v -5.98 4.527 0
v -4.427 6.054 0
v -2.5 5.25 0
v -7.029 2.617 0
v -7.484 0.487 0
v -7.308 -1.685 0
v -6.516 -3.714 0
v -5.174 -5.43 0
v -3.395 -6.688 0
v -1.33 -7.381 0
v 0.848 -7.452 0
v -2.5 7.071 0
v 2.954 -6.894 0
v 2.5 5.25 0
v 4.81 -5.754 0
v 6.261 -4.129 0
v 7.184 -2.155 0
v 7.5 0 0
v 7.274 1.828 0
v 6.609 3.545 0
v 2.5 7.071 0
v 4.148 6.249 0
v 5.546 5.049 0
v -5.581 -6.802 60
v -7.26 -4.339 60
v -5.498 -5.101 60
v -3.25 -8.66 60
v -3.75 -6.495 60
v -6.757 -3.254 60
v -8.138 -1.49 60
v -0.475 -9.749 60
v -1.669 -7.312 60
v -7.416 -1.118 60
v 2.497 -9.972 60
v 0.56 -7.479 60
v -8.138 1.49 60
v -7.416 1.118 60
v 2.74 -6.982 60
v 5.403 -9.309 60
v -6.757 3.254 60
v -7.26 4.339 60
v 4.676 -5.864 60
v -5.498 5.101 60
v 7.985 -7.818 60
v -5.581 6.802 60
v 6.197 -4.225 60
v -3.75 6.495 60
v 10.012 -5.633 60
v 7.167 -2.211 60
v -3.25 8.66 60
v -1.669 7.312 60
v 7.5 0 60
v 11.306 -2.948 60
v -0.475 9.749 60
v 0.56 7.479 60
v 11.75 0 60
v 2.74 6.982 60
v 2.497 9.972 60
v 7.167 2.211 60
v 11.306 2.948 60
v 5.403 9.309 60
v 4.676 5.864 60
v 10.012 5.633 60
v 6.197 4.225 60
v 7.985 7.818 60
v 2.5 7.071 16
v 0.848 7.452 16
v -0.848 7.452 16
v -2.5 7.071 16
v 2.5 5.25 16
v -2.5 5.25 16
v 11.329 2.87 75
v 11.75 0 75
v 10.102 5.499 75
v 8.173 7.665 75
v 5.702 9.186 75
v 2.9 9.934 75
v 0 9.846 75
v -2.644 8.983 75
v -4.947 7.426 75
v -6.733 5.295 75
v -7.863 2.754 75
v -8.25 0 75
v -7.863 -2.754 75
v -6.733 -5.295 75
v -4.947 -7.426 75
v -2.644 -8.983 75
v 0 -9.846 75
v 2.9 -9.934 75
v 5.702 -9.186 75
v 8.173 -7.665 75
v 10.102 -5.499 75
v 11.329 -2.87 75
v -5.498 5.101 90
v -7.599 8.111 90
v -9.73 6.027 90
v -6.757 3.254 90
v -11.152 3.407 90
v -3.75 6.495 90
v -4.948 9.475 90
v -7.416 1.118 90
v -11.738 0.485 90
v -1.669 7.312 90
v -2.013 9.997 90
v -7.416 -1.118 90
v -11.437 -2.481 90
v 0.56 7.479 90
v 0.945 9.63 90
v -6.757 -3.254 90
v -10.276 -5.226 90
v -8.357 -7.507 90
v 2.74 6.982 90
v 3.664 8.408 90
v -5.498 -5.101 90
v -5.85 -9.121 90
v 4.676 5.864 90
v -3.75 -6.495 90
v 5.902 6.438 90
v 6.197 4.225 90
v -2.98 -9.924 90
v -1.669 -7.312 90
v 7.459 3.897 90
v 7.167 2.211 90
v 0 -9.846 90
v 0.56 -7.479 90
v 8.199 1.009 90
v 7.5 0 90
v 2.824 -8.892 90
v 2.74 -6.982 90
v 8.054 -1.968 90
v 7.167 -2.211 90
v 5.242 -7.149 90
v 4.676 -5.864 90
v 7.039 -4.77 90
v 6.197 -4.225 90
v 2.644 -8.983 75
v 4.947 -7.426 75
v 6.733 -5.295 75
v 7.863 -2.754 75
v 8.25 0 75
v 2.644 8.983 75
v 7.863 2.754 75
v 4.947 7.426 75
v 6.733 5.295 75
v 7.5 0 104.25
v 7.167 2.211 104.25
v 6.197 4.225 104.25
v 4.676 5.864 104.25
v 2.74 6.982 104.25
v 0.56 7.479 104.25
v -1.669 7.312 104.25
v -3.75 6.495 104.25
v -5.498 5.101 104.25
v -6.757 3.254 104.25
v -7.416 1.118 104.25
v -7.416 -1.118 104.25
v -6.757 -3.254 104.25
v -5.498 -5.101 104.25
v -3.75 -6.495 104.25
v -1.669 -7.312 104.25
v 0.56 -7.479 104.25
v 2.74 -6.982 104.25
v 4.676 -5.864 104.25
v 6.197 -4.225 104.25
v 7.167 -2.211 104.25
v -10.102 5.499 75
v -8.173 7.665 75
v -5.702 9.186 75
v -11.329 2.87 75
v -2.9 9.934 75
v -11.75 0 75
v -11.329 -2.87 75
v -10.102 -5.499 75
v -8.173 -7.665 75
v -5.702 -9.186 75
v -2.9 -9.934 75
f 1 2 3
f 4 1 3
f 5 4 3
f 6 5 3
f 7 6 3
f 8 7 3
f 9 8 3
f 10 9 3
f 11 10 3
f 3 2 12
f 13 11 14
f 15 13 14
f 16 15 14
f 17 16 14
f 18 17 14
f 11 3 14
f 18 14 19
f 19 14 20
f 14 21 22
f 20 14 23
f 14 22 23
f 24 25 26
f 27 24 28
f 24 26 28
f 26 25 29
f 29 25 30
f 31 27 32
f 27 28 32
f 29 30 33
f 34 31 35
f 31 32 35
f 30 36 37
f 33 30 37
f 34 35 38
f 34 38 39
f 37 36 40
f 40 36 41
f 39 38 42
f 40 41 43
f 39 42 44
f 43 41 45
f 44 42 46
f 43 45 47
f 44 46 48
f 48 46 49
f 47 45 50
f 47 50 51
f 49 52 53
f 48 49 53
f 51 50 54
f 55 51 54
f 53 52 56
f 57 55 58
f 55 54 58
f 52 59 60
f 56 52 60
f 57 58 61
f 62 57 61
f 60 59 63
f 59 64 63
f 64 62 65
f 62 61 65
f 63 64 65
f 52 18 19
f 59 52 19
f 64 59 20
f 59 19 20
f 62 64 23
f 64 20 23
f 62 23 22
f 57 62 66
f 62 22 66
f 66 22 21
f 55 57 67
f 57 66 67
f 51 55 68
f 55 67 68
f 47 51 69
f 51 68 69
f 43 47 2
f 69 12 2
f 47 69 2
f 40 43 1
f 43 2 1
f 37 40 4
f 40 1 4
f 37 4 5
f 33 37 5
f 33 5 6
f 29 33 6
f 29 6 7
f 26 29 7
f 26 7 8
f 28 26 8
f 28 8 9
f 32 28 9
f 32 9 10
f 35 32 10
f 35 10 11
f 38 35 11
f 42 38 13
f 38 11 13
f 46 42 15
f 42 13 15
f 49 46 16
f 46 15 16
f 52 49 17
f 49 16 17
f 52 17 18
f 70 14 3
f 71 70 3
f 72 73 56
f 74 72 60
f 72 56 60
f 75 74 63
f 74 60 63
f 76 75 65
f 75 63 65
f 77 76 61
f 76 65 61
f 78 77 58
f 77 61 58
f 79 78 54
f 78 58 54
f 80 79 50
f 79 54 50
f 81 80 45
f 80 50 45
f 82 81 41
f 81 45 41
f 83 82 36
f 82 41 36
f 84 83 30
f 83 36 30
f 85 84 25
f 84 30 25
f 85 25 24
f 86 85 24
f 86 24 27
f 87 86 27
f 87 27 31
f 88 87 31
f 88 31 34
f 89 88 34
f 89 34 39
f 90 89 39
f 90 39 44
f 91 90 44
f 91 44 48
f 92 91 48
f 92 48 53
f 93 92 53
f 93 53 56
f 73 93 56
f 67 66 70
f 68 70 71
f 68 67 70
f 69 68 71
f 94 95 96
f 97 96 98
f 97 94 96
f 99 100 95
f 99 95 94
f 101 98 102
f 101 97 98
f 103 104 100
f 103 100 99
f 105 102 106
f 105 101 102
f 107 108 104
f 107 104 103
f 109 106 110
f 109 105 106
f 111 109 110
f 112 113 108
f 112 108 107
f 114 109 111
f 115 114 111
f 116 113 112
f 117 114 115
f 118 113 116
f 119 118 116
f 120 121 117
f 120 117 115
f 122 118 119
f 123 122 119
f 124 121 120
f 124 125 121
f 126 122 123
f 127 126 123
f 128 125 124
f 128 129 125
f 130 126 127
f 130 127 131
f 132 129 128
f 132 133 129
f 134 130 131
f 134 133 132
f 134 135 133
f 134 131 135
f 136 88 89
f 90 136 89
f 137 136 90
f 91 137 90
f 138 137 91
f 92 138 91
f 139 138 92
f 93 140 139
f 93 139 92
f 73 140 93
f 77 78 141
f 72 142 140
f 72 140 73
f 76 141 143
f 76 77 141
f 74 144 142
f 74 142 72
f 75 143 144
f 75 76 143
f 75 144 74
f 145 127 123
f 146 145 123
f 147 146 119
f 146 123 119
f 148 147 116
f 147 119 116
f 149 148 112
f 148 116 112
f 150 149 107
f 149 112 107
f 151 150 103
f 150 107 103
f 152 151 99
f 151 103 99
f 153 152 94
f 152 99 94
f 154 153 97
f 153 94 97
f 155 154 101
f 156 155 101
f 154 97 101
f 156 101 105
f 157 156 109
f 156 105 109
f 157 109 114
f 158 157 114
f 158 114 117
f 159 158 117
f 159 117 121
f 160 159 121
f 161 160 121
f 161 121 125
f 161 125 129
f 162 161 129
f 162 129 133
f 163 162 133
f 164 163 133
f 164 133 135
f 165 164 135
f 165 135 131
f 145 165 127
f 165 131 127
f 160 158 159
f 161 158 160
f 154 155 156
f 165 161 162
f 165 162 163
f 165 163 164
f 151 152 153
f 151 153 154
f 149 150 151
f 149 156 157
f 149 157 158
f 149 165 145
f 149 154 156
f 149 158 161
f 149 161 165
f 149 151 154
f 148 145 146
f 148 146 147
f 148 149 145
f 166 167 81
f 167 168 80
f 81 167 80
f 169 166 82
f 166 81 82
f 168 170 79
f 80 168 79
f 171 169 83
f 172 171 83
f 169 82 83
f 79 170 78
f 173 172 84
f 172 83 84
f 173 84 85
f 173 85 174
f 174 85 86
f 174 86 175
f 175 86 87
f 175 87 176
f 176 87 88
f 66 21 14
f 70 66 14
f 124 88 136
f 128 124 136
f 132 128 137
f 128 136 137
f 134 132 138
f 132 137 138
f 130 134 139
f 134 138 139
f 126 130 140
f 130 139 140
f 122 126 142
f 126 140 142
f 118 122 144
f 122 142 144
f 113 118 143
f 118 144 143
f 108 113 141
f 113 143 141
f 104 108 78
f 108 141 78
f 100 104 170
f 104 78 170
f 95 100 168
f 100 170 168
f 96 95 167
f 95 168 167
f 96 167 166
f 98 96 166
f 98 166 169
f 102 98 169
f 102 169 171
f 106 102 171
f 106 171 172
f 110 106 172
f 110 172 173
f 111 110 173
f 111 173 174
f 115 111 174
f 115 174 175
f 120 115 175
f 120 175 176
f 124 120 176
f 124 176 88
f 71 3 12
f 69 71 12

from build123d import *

# Parameters (mm, degrees)
ESQUISSE2_R             = 7.5
BOSS_EXTRU_1_DEPTH      = 60
ESQUISSE3_R             = 10
BOSS_EXTRU_2_DEPTH      = 15
ESQUISSE4_R             = 10
BOSS_EXTRU_3_DEPTH      = 15
ESQUISSE5_R             = 7.5
BOSS_EXTRU_4_DEPTH      = 14.25
ENL_V_MAT_EXTRU_1_DEPTH = 16


with BuildPart() as part:
    # Esquisse2 → Boss.-Extru.1 (new body)
    with BuildSketch(Plane.XY):
        Circle(ESQUISSE2_R)
    extrude(amount=BOSS_EXTRU_1_DEPTH)

    # Esquisse3 → Boss.-Extru.2 (add)
    with BuildSketch(Plane.XY.offset(60)):
        with Locations((1.75, 0)):
            Circle(ESQUISSE3_R)
    extrude(amount=BOSS_EXTRU_2_DEPTH)

    # Esquisse4 → Boss.-Extru.3 (add)
    with BuildSketch(Plane.XY.offset(75)):
        with Locations(Location((-1.75, 0, 0), (0, 0, 280.078658108))):
            Circle(ESQUISSE4_R)
    extrude(amount=BOSS_EXTRU_3_DEPTH)

    # Esquisse5 → Boss.-Extru.4 (add)
    with BuildSketch(Plane.XY.offset(90)):
        Circle(ESQUISSE5_R)
    extrude(amount=BOSS_EXTRU_4_DEPTH)

    # Esquisse6 → Enlèv. mat.-Extru.1 (cut)
    with BuildSketch(Plane(origin=(0, 0, 0), x_dir=(-1, 0, 0), z_dir=(0, 0, -1))):
        with BuildLine():
            Line((-2.5, 7.071067812), (-2.5, 5.25))
            Line((-2.5, 5.25), (2.5, 5.25))
            Line((2.5, 5.25), (2.5, 7.071067812))
            ThreePointArc((2.5, 7.071067812), (0, 7.5), (-2.5, 7.071067812))
        make_face()
    extrude(amount=-ENL_V_MAT_EXTRU_1_DEPTH, mode=Mode.SUBTRACT)


solid = part.part
